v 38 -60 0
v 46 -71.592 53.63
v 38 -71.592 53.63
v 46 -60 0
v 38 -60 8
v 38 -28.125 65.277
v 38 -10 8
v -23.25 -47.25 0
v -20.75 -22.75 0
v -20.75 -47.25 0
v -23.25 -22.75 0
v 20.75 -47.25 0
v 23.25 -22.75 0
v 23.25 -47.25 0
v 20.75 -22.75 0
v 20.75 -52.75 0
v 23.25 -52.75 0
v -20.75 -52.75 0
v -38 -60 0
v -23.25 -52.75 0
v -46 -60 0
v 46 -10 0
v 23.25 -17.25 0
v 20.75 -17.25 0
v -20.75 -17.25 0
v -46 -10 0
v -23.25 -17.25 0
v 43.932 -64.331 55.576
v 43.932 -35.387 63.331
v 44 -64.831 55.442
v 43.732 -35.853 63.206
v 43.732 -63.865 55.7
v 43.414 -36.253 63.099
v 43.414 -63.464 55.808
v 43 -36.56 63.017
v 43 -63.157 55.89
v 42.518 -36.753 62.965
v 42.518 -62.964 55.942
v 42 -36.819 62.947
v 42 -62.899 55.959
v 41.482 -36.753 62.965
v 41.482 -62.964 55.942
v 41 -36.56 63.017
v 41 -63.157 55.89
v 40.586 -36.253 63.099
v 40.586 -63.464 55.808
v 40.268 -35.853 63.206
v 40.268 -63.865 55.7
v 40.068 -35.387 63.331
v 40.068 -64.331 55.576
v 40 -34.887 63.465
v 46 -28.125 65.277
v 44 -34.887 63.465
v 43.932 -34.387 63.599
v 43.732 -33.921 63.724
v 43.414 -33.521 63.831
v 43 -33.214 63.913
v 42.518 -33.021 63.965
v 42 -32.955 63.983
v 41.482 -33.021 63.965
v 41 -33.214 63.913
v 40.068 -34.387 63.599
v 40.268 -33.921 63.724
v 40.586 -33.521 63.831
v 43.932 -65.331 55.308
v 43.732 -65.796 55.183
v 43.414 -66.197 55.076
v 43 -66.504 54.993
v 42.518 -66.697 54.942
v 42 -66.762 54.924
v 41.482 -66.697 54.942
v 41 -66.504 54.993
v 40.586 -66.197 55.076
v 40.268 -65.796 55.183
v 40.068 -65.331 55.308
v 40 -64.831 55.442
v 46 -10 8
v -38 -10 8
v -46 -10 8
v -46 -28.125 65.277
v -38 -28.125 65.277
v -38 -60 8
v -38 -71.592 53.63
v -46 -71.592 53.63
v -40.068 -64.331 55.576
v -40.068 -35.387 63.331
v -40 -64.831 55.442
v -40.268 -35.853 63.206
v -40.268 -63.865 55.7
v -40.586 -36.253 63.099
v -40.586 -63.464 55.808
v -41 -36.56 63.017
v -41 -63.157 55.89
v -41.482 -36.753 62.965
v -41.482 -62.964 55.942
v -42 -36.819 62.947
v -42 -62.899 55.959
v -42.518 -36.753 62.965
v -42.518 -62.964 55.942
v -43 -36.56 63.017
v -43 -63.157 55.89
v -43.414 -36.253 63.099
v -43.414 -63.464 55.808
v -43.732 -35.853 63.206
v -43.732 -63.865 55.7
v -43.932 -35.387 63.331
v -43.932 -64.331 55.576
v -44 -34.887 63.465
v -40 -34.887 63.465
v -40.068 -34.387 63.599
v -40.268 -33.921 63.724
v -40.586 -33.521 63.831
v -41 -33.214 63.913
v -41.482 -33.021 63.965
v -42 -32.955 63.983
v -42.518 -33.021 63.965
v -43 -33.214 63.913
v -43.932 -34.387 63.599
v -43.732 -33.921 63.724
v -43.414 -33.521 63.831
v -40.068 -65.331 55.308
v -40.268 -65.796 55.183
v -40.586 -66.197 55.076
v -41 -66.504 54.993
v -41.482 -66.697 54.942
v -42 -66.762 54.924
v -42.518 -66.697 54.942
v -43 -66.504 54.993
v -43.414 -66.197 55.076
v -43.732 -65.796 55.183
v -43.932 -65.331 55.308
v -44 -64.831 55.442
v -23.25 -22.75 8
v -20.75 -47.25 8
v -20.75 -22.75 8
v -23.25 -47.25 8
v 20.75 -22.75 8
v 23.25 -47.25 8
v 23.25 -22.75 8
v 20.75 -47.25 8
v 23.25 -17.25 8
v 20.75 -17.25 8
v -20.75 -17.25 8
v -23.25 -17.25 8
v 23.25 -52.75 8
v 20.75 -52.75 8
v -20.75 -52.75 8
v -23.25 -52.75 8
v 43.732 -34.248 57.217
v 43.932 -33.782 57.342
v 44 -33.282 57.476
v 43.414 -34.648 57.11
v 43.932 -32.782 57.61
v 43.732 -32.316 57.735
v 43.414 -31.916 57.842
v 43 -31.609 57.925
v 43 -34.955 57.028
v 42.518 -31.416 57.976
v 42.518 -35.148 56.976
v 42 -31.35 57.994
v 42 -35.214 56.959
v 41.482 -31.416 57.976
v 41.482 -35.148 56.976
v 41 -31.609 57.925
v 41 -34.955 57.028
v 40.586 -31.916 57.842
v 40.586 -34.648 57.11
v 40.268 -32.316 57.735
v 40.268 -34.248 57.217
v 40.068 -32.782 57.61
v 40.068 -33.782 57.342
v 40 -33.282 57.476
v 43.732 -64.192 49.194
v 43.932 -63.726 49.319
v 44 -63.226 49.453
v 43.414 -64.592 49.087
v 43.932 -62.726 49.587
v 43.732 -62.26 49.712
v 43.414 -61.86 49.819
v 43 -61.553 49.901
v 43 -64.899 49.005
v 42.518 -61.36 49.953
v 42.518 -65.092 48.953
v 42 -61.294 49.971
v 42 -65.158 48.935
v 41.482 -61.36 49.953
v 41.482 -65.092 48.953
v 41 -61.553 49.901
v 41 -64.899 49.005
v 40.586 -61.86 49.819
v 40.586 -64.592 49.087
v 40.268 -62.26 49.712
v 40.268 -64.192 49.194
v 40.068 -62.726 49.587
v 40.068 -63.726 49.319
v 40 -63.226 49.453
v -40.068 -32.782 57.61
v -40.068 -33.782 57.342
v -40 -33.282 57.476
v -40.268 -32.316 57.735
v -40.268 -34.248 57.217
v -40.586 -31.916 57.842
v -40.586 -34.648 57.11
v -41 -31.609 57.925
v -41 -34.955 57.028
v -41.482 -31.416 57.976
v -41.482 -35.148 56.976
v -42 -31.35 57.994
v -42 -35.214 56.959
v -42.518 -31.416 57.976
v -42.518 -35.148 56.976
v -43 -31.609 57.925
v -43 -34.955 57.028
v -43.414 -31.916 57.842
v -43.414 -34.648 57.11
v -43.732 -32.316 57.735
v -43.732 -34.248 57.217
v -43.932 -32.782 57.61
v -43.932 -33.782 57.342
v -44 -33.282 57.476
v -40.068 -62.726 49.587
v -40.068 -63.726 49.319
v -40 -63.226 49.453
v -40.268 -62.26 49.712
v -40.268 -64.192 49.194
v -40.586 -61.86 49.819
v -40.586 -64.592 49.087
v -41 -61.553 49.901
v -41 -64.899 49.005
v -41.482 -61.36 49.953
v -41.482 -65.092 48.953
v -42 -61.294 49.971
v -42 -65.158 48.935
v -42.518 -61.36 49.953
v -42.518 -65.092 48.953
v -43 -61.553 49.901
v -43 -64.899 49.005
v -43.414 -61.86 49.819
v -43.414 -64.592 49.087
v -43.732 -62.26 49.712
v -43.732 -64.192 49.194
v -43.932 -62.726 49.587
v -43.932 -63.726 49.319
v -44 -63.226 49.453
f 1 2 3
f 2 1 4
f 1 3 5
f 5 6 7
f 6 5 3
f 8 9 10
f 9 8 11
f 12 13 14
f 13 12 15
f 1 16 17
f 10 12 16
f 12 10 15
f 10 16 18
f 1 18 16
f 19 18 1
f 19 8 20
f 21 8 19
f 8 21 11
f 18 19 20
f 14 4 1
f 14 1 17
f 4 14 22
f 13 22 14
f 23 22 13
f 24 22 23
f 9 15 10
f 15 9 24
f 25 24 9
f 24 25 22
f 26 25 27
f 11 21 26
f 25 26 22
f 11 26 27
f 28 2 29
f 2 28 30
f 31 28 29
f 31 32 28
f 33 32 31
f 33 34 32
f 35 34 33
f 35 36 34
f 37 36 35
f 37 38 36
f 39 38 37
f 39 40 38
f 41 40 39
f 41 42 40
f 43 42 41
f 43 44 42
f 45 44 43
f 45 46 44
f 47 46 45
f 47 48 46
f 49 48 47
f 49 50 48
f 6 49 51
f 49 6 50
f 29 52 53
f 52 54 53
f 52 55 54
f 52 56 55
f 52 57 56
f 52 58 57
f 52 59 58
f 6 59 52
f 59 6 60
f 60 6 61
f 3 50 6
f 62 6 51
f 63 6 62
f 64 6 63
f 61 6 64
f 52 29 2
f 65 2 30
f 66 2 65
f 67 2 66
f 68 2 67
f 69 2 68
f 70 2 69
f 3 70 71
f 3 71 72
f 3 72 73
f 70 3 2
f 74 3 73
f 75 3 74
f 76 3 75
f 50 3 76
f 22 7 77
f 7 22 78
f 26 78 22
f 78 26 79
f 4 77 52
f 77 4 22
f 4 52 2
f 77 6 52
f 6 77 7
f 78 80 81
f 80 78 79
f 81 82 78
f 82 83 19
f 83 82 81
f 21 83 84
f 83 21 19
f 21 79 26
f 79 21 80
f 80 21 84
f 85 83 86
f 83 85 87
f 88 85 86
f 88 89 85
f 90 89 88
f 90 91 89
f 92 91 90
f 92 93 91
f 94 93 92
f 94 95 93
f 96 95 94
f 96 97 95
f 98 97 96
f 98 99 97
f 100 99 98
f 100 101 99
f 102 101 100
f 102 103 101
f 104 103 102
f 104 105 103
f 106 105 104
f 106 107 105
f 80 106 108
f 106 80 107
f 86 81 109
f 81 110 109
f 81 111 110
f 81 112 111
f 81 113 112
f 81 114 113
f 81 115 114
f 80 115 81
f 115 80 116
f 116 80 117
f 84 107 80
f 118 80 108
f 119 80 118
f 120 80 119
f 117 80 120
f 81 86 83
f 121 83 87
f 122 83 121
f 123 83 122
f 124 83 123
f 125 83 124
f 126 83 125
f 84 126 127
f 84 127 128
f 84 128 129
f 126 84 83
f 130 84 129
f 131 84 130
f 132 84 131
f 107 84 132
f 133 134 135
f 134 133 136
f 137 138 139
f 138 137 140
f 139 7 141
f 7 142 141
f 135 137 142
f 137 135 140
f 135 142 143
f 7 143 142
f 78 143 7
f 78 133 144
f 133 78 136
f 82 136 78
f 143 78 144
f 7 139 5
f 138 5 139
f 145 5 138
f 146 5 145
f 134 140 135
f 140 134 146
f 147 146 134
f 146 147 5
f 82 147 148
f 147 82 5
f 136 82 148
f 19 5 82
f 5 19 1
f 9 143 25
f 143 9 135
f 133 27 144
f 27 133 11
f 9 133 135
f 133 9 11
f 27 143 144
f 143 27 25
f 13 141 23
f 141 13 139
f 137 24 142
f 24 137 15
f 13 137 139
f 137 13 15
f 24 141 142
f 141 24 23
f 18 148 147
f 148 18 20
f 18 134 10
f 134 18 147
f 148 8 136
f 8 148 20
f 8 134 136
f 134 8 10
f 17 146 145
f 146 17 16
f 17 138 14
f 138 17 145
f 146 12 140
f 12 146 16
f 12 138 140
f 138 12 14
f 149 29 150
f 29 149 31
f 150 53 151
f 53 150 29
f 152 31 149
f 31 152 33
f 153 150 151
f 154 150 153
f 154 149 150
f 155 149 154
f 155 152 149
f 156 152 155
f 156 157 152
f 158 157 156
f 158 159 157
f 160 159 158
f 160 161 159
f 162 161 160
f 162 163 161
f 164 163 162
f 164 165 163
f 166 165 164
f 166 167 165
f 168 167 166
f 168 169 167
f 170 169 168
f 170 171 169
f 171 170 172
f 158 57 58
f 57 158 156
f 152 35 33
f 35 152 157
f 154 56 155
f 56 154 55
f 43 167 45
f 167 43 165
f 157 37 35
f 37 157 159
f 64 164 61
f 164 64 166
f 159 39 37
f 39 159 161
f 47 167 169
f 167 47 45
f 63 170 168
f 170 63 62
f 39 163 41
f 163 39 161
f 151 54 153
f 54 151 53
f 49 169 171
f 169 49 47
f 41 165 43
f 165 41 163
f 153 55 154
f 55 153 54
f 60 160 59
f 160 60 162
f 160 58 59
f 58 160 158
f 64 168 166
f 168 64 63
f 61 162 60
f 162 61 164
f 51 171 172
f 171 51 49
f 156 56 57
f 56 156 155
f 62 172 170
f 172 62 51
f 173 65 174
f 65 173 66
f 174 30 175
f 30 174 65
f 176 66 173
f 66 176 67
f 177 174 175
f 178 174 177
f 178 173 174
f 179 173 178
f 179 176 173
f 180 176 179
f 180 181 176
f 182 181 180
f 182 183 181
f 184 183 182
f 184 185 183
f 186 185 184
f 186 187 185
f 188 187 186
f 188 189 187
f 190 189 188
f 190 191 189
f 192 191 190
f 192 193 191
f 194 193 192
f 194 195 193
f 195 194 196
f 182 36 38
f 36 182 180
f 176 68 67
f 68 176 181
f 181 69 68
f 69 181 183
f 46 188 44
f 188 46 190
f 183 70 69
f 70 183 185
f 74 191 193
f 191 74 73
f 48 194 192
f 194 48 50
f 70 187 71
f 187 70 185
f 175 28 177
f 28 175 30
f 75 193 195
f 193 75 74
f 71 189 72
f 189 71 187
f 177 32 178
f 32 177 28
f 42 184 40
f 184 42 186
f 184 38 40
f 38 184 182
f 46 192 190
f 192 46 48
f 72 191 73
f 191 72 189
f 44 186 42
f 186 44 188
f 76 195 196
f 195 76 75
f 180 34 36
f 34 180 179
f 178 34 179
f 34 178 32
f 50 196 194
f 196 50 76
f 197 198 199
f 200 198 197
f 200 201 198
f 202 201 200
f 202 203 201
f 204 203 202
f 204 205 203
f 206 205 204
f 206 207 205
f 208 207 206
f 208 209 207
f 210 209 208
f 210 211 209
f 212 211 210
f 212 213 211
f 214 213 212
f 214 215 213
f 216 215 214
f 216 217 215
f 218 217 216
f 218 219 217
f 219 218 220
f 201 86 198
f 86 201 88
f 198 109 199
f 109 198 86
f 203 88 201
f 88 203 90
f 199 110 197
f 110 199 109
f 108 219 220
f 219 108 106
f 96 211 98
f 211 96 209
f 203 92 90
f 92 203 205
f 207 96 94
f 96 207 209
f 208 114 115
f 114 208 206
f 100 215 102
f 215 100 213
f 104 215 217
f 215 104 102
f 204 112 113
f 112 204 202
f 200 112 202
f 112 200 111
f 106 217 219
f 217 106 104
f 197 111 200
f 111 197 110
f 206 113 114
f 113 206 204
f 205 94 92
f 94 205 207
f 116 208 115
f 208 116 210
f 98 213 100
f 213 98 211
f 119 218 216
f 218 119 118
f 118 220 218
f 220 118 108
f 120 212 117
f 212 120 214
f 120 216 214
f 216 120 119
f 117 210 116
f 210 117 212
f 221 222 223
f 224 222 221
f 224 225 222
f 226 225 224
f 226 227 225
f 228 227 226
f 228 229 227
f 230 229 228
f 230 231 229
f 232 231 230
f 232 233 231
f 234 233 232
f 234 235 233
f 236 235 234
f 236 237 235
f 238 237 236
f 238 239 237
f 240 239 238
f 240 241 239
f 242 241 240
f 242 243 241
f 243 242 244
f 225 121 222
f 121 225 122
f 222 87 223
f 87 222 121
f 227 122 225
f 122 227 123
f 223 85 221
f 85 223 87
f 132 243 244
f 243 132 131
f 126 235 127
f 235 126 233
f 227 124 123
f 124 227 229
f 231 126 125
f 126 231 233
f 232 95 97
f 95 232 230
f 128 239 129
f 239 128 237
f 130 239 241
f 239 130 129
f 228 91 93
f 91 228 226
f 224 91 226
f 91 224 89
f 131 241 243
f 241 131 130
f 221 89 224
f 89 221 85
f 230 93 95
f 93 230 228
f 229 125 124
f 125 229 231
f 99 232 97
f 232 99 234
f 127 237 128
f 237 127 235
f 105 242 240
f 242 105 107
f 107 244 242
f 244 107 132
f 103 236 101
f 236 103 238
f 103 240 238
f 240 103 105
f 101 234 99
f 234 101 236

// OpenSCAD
// file: ../sharedDims.scad
$fn=180;

/* [Printer] */
printBed            = 200;

/* [Hardware] */
m3InsertD           = 4.0;  //M3 heat-set insert hole -- check your insert's datasheet
m3InsertDepth       = 6.2;  //for a 5.7 mm long insert, plus a little for melt-back
m4InsertD           = 5.0;
m4InsertDepth       = 8.0;

/* [Shaft Adapter] */
adapterDia      = 20;
pinLatOffset    = 6;
numPins         = 2;

//overall
clDist              = 60;

/* [Hopper] */
wallThickness   = 5;
baseThickness   = 8;
hopperWidth     = 100;
hopperHeight    = 50;
hopperDepth     = 60;
hopperConvergeAngle       = 30;
dropHoleSize    = 30;
mountAngle      = 45;
//NEMA17 motor dimensions
shaftSquareDim      = 3;
shaftDia            = 5;
shaftDwidth         = 4.5;
flatLength          = 12;
motorHolePatternX   = 31;
motorHolePatternY   = 31;
motorClearanceCircle= 23;

/* [Singulator] */
singulatorDiameter      = 80;
singulatorExposureAngle = 90;
numHoles                = 4;
caseCutout              = 10;

/* [Funnel] */
topDia              = 40;
exitDia             = 20;
funnelHeight        = 30;

/* [Movable Support] */
supportScrewSize    = 6.6;
supportThickness    = 6;
cabinetWallThk      = 6;  //cabinet faces (ply or print); the servo mount bolts to the inside of the left panel
cornerBlock         = 20; //printed blocks in the cabinet's vertical corners -- at the base, the tile seam and
                          //the top; every wall screws into them
tileLap             = 16; //where a printed wall's two tiles meet: a half-lap this tall, glued and screwed

//MG90S servo -- typical numbers, measure yours
servoBodyL          = 22.8; //case length, along the ears
servoBodyW          = 12.2;
servoBodyH          = 22.7; //case bottom to case top, not counting the output boss
servoShaftToEnd     = 6.1;  //output shaft centre to the short end of the case
servoEarSpan        = 32.2; //tip to tip of the mounting ears
servoEarHolePitch   = 27.8;
servoEarThk         = 2.5;
servoEarDrop        = 4.0;  //case top down to the top face of the ears
servoWallClear      = 1.2;  //air between the servo's wall-side ear and the inside of the cabinet wall
servoEarsToArm      = 13.5; //measured: the servo mount's top face (the ears' underside) up to the arm's underside, horn on
//distance from the outside wall of the box to the servo's axis: the wall, then as far as the
//wall-side ear reaches from the shaft (half the ear span, less the case centre's offset
//behind the shaft), then the clearance. It has to come after the servo numbers it uses.
servoBackset        = cabinetWallThk + (servoEarSpan/2 - (servoBodyL/2 - servoShaftToEnd)) + servoWallClear;

//stack spacing down the drop axis
dropToFunnelRim     = 18;   //discharge exit down to the funnel's top rim
funnelToCoil        = 15;   //funnel exit down to the centre of the coil
maxCaseLen          = 69.2; //the longest case it takes (.338 Lapua Mag); shorter ones ride up the thumbscrew
funnelToCase        = maxCaseLen + 7;   //funnel exit down to the thumbscrew head at its lowest: the longest
                                        //case, with its mouth clear of the funnel
caseToArm           = 16;   //thumbscrew head at its lowest down to the top face of the horn arm

/* [Heatsink Holder] */
//induction heater heatsinks -- the pair on the heatsink holder, inside the cabinet; the coil's
//leads come through the wall and plug into them, and the transformer's cables leave the far end
heatsinkSpacing     = 20;   //between their flat faces: the holder's width across them
heatsinkH           = 54;   //overall, across the fins
heatsinkFinReach    = 5.25; //the fins stand this far proud of the flat face, toward the holder
heatsinkDepth       = 18.5; //flat face out to the back of the curved base (round, not square -- see layout)
heatsinkLen         = 38;   //extrusion length, the same as the holder
heatsinkBoreIn      = 7;    //the coil's lead plugs in this far in from the flat face, at mid-height

//the driver board's fan -- a standard 40 x 20
driverFanSize       = 40;   //square
driverFanDepth      = 20;
driverFanHolePitch  = 32;   //between its screw holes (M3)

//induction coil leads, where they pass through the cabinet wall
coilTube            = 4;    //copper tube OD
leadGap             = heatsinkSpacing + 2*heatsinkBoreIn;   //centre-to-centre: the heatsinks' lead bores
grommetLip          = 2.5;  //the pass-through is grown by this for the grommet
wallBackset         = 0; 
// main file
include <../sharedDims.scad>

// Cradle for the harvested heater's transformer: a bridge over the driver
// board. A slab lies under the transformer, its top face along the
// transformer's underside, on a leg either side of the board down to the
// cabinet floor, where M3 screws come up into heat-set inserts in the feet.
// Two zip ties go over the transformer and down through the slab either
// side of it; snug slots keep them from sliding, and they're all that holds
// the transformer along its slope.
//
// The shim: the cradle was drawn for a shallower transformer. To steepen it
// without reprinting, a wedge on the slab tips it on to shimTilt, the tie
// slots running through both. Its own part is transformerShim.scad.
//
// Prints on the slab's top face: the slab spans leg to leg within its
// layers, and the legs are walls carrying the load straight down. Their
// edges lean 45 deg; the tie slots come out vertical.
//
// Frame: X front to back as in the assembly, but centred on the
// transformer's axis; Y to the right, along its run; Z up. The origin is on
// the floor under the centre of its left (upper) end face. Everything under
// "keep in step" has to match cad/cabinet/boxLayout.scad, which checks it.

/* [Transformer and board -- keep in step with boxLayout.scad] */
xfmrD      = 63.5;  // transformer diameter...
xfmrLen    = 90;    // ...and length
tilt       = 15;    // its axis, below horizontal
endH       = 101;   // its axis above the floor, at its left (upper) end face
boardTopH  = 44;    // the driver board's top above the floor (it lies under the transformer)...
boardHalfW = 22;    // ...and its farther edge from the axis

/* [Cradle] */
slabT     = 8;
slabFrom  = 10;     // along the transformer from its left end...
slabTo    = 60;     // ...to here, where the legs end -- any further and the slab drops onto the board
legTo     = 60;     // the legs carry the slab this far along (no further than slabTo)
legX      = [38, 46];   // each leg, off the axis
footLen   = 45;     // along Y, on the floor

/* [Shim -- keep shimTilt in step with boxLayout.scad's xfmrDown] */
shimTilt  = 25;     // the transformer's axis on the shim, below horizontal
shimThin  = 2;      // the wedge at its lower end

/* [Zip ties] */
tieW      = 5.5;    // slot along the transformer, for ties up to ~4.8 wide (a tie over the
tieT      = 2.5;    // transformer lies flat on it)... and across, for ties up to ~1.3 thick
tieAt     = [20, 50];   // along the transformer from its left end -- on the slab, 10 in from each end
tieX      = 22;     // either side of the axis

r = xfmrD/2;
slabLow = endH - slabTo*sin(tilt) - (r + slabT)*cos(tilt);   // the slab's lowest point, above the floor
assert(slabLow >= boardTopH + 3, "the slab drops onto the driver board");
assert(endH - xfmrLen*sin(tilt) - r*cos(tilt) >= boardTopH + 3, "the transformer's lower end drops onto the driver board");
assert(legTo <= slabTo, "the legs run past the slab");
assert(min(tieAt) - tieW/2 >= slabFrom + 3 && max(tieAt) + tieW/2 <= slabTo - 3, "the zip tie slots run off the slab");
assert(legX[0] >= boardHalfW + 2, "the legs run into the driver board");
assert(legX[0] > r + 2, "the legs run into the transformer");
// the feet, along Y: centred under the legs' stretch of the slab
footMidY = ((slabFrom + legTo)/2)*cos(tilt) - (r + slabT/2)*sin(tilt);

//for the assembly: what the cradle was drawn for, and where its feet's screws go (x, y)
function transformerCradleFit() = [xfmrD, xfmrLen, tilt, endH, boardTopH, boardHalfW];
//...the shim's angle and thin end, and where the middle of the transformer's upper
//end lands on it, its middle over the shim's middle: [y, z] in the cradle's frame
function transformerShimFit() = [shimTilt, shimThin];
function shim_top(y) = -r + shimThin + (slabTo - y)*tan(shimTilt - tilt);   // the shim's top, up off the slab's, in the axis frame
function axis_yz(p) = [p[0]*cos(tilt) + p[1]*sin(tilt), -p[0]*sin(tilt) + p[1]*cos(tilt) + endH];
function transformerOnShim() =
    let (ym = (slabFrom + slabTo)/2,
         m  = axis_yz([ym, shim_top(ym)]),                 // the shim's top, halfway along
         n  = [sin(shimTilt), cos(shimTilt)],              // square off it, up
         d  = [cos(shimTilt), -sin(shimTilt)])             // down its slope
    m + r*n - (xfmrLen/2)*d;
assert(shimTilt >= tilt, "the shim can only steepen the transformer");
function transformerCradleFootHoles() =
    [for (s = [1, -1], y = [-1, 1]) [s*(legX[0] + legX[1])/2, footMidY + y*(footLen/2 - 7)]];

// the transformer's frame: X across, Y along its axis from the left end face,
// Z square to both (up, away from the underside); it occupies |(x, z)| <= r
module axis_frame() {
    multmatrix([[1, 0,          0,          0],
                [0, cos(tilt),  sin(tilt),  0],
                [0, -sin(tilt), cos(tilt),  endH],
                [0, 0,          0,          1]]) children();
}

module slab(x0, x1, t1 = slabTo) { axis_frame() translate([x0, slabFrom, -r - slabT]) cube([x1 - x0, t1 - slabFrom, slabT]); }

module transformerCradle() {
    difference() {
        union() {
            slab(-legX[1], legX[1]);
            //legs: the slab's ends, down to the floor
            for (s = [1, -1]) mirror([s < 0 ? 1 : 0, 0, 0]) hull() {
                slab(legX[0], legX[1], legTo);
                translate([legX[0], footMidY - footLen/2, 0]) cube([legX[1] - legX[0], footLen, 1]);
            }
        }
        //zip tie slots, through the slab either side of the transformer
        for (y = tieAt, x = [-tieX, tieX])
            axis_frame() translate([x - tieT/2, y - tieW/2, -r - slabT - 1]) cube([tieT, tieW, slabT + 2]);
        //M3 heat-set inserts up into the feet, for screws from under the floor
        for (h = transformerCradleFootHoles())
            translate([h[0], h[1], -1]) cylinder(d=m3InsertD, h=m3InsertDepth + 1, $fn=24);
    }
}

// The shim, on the slab, in the cradle's frame: a wedge the slab's width and
// length, thin at the lower end, with the tie slots through it.
module transformerShim() {
    difference() {
        axis_frame() multmatrix([[0, 0, 1, -legX[1]], [1, 0, 0, 0], [0, 1, 0, 0], [0, 0, 0, 1]])
            linear_extrude(height = 2*legX[1])
                polygon([[slabFrom, -r], [slabTo, -r], [slabTo, shim_top(slabTo)], [slabFrom, shim_top(slabFrom)]]);
        for (y = tieAt, x = [-tieX, tieX])
            axis_frame() translate([x - tieT/2, y - tieW/2, -r - 1]) cube([tieT, tieW, shim_top(slabFrom) + r + 2]);
    }
}

// Laid for printing: on its bottom face (the one on the slab).
module transformerShim_print() {
    translate([0, 0, r])
        multmatrix([[1, 0, 0, 0], [0, cos(tilt), -sin(tilt), 0], [0, sin(tilt), cos(tilt), 0], [0, 0, 0, 1]])
            translate([0, 0, -endH]) transformerShim();
}

// Laid for printing: on the slab's top face, the legs straight up.
module transformerCradle_print() {
    translate([0, 0, -r]) rotate([180, 0, 0])
        multmatrix([[1, 0, 0, 0], [0, cos(tilt), -sin(tilt), 0], [0, sin(tilt), cos(tilt), 0], [0, 0, 0, 1]])
            translate([0, 0, -endH]) transformerCradle();
}

transformerCradle_print();
